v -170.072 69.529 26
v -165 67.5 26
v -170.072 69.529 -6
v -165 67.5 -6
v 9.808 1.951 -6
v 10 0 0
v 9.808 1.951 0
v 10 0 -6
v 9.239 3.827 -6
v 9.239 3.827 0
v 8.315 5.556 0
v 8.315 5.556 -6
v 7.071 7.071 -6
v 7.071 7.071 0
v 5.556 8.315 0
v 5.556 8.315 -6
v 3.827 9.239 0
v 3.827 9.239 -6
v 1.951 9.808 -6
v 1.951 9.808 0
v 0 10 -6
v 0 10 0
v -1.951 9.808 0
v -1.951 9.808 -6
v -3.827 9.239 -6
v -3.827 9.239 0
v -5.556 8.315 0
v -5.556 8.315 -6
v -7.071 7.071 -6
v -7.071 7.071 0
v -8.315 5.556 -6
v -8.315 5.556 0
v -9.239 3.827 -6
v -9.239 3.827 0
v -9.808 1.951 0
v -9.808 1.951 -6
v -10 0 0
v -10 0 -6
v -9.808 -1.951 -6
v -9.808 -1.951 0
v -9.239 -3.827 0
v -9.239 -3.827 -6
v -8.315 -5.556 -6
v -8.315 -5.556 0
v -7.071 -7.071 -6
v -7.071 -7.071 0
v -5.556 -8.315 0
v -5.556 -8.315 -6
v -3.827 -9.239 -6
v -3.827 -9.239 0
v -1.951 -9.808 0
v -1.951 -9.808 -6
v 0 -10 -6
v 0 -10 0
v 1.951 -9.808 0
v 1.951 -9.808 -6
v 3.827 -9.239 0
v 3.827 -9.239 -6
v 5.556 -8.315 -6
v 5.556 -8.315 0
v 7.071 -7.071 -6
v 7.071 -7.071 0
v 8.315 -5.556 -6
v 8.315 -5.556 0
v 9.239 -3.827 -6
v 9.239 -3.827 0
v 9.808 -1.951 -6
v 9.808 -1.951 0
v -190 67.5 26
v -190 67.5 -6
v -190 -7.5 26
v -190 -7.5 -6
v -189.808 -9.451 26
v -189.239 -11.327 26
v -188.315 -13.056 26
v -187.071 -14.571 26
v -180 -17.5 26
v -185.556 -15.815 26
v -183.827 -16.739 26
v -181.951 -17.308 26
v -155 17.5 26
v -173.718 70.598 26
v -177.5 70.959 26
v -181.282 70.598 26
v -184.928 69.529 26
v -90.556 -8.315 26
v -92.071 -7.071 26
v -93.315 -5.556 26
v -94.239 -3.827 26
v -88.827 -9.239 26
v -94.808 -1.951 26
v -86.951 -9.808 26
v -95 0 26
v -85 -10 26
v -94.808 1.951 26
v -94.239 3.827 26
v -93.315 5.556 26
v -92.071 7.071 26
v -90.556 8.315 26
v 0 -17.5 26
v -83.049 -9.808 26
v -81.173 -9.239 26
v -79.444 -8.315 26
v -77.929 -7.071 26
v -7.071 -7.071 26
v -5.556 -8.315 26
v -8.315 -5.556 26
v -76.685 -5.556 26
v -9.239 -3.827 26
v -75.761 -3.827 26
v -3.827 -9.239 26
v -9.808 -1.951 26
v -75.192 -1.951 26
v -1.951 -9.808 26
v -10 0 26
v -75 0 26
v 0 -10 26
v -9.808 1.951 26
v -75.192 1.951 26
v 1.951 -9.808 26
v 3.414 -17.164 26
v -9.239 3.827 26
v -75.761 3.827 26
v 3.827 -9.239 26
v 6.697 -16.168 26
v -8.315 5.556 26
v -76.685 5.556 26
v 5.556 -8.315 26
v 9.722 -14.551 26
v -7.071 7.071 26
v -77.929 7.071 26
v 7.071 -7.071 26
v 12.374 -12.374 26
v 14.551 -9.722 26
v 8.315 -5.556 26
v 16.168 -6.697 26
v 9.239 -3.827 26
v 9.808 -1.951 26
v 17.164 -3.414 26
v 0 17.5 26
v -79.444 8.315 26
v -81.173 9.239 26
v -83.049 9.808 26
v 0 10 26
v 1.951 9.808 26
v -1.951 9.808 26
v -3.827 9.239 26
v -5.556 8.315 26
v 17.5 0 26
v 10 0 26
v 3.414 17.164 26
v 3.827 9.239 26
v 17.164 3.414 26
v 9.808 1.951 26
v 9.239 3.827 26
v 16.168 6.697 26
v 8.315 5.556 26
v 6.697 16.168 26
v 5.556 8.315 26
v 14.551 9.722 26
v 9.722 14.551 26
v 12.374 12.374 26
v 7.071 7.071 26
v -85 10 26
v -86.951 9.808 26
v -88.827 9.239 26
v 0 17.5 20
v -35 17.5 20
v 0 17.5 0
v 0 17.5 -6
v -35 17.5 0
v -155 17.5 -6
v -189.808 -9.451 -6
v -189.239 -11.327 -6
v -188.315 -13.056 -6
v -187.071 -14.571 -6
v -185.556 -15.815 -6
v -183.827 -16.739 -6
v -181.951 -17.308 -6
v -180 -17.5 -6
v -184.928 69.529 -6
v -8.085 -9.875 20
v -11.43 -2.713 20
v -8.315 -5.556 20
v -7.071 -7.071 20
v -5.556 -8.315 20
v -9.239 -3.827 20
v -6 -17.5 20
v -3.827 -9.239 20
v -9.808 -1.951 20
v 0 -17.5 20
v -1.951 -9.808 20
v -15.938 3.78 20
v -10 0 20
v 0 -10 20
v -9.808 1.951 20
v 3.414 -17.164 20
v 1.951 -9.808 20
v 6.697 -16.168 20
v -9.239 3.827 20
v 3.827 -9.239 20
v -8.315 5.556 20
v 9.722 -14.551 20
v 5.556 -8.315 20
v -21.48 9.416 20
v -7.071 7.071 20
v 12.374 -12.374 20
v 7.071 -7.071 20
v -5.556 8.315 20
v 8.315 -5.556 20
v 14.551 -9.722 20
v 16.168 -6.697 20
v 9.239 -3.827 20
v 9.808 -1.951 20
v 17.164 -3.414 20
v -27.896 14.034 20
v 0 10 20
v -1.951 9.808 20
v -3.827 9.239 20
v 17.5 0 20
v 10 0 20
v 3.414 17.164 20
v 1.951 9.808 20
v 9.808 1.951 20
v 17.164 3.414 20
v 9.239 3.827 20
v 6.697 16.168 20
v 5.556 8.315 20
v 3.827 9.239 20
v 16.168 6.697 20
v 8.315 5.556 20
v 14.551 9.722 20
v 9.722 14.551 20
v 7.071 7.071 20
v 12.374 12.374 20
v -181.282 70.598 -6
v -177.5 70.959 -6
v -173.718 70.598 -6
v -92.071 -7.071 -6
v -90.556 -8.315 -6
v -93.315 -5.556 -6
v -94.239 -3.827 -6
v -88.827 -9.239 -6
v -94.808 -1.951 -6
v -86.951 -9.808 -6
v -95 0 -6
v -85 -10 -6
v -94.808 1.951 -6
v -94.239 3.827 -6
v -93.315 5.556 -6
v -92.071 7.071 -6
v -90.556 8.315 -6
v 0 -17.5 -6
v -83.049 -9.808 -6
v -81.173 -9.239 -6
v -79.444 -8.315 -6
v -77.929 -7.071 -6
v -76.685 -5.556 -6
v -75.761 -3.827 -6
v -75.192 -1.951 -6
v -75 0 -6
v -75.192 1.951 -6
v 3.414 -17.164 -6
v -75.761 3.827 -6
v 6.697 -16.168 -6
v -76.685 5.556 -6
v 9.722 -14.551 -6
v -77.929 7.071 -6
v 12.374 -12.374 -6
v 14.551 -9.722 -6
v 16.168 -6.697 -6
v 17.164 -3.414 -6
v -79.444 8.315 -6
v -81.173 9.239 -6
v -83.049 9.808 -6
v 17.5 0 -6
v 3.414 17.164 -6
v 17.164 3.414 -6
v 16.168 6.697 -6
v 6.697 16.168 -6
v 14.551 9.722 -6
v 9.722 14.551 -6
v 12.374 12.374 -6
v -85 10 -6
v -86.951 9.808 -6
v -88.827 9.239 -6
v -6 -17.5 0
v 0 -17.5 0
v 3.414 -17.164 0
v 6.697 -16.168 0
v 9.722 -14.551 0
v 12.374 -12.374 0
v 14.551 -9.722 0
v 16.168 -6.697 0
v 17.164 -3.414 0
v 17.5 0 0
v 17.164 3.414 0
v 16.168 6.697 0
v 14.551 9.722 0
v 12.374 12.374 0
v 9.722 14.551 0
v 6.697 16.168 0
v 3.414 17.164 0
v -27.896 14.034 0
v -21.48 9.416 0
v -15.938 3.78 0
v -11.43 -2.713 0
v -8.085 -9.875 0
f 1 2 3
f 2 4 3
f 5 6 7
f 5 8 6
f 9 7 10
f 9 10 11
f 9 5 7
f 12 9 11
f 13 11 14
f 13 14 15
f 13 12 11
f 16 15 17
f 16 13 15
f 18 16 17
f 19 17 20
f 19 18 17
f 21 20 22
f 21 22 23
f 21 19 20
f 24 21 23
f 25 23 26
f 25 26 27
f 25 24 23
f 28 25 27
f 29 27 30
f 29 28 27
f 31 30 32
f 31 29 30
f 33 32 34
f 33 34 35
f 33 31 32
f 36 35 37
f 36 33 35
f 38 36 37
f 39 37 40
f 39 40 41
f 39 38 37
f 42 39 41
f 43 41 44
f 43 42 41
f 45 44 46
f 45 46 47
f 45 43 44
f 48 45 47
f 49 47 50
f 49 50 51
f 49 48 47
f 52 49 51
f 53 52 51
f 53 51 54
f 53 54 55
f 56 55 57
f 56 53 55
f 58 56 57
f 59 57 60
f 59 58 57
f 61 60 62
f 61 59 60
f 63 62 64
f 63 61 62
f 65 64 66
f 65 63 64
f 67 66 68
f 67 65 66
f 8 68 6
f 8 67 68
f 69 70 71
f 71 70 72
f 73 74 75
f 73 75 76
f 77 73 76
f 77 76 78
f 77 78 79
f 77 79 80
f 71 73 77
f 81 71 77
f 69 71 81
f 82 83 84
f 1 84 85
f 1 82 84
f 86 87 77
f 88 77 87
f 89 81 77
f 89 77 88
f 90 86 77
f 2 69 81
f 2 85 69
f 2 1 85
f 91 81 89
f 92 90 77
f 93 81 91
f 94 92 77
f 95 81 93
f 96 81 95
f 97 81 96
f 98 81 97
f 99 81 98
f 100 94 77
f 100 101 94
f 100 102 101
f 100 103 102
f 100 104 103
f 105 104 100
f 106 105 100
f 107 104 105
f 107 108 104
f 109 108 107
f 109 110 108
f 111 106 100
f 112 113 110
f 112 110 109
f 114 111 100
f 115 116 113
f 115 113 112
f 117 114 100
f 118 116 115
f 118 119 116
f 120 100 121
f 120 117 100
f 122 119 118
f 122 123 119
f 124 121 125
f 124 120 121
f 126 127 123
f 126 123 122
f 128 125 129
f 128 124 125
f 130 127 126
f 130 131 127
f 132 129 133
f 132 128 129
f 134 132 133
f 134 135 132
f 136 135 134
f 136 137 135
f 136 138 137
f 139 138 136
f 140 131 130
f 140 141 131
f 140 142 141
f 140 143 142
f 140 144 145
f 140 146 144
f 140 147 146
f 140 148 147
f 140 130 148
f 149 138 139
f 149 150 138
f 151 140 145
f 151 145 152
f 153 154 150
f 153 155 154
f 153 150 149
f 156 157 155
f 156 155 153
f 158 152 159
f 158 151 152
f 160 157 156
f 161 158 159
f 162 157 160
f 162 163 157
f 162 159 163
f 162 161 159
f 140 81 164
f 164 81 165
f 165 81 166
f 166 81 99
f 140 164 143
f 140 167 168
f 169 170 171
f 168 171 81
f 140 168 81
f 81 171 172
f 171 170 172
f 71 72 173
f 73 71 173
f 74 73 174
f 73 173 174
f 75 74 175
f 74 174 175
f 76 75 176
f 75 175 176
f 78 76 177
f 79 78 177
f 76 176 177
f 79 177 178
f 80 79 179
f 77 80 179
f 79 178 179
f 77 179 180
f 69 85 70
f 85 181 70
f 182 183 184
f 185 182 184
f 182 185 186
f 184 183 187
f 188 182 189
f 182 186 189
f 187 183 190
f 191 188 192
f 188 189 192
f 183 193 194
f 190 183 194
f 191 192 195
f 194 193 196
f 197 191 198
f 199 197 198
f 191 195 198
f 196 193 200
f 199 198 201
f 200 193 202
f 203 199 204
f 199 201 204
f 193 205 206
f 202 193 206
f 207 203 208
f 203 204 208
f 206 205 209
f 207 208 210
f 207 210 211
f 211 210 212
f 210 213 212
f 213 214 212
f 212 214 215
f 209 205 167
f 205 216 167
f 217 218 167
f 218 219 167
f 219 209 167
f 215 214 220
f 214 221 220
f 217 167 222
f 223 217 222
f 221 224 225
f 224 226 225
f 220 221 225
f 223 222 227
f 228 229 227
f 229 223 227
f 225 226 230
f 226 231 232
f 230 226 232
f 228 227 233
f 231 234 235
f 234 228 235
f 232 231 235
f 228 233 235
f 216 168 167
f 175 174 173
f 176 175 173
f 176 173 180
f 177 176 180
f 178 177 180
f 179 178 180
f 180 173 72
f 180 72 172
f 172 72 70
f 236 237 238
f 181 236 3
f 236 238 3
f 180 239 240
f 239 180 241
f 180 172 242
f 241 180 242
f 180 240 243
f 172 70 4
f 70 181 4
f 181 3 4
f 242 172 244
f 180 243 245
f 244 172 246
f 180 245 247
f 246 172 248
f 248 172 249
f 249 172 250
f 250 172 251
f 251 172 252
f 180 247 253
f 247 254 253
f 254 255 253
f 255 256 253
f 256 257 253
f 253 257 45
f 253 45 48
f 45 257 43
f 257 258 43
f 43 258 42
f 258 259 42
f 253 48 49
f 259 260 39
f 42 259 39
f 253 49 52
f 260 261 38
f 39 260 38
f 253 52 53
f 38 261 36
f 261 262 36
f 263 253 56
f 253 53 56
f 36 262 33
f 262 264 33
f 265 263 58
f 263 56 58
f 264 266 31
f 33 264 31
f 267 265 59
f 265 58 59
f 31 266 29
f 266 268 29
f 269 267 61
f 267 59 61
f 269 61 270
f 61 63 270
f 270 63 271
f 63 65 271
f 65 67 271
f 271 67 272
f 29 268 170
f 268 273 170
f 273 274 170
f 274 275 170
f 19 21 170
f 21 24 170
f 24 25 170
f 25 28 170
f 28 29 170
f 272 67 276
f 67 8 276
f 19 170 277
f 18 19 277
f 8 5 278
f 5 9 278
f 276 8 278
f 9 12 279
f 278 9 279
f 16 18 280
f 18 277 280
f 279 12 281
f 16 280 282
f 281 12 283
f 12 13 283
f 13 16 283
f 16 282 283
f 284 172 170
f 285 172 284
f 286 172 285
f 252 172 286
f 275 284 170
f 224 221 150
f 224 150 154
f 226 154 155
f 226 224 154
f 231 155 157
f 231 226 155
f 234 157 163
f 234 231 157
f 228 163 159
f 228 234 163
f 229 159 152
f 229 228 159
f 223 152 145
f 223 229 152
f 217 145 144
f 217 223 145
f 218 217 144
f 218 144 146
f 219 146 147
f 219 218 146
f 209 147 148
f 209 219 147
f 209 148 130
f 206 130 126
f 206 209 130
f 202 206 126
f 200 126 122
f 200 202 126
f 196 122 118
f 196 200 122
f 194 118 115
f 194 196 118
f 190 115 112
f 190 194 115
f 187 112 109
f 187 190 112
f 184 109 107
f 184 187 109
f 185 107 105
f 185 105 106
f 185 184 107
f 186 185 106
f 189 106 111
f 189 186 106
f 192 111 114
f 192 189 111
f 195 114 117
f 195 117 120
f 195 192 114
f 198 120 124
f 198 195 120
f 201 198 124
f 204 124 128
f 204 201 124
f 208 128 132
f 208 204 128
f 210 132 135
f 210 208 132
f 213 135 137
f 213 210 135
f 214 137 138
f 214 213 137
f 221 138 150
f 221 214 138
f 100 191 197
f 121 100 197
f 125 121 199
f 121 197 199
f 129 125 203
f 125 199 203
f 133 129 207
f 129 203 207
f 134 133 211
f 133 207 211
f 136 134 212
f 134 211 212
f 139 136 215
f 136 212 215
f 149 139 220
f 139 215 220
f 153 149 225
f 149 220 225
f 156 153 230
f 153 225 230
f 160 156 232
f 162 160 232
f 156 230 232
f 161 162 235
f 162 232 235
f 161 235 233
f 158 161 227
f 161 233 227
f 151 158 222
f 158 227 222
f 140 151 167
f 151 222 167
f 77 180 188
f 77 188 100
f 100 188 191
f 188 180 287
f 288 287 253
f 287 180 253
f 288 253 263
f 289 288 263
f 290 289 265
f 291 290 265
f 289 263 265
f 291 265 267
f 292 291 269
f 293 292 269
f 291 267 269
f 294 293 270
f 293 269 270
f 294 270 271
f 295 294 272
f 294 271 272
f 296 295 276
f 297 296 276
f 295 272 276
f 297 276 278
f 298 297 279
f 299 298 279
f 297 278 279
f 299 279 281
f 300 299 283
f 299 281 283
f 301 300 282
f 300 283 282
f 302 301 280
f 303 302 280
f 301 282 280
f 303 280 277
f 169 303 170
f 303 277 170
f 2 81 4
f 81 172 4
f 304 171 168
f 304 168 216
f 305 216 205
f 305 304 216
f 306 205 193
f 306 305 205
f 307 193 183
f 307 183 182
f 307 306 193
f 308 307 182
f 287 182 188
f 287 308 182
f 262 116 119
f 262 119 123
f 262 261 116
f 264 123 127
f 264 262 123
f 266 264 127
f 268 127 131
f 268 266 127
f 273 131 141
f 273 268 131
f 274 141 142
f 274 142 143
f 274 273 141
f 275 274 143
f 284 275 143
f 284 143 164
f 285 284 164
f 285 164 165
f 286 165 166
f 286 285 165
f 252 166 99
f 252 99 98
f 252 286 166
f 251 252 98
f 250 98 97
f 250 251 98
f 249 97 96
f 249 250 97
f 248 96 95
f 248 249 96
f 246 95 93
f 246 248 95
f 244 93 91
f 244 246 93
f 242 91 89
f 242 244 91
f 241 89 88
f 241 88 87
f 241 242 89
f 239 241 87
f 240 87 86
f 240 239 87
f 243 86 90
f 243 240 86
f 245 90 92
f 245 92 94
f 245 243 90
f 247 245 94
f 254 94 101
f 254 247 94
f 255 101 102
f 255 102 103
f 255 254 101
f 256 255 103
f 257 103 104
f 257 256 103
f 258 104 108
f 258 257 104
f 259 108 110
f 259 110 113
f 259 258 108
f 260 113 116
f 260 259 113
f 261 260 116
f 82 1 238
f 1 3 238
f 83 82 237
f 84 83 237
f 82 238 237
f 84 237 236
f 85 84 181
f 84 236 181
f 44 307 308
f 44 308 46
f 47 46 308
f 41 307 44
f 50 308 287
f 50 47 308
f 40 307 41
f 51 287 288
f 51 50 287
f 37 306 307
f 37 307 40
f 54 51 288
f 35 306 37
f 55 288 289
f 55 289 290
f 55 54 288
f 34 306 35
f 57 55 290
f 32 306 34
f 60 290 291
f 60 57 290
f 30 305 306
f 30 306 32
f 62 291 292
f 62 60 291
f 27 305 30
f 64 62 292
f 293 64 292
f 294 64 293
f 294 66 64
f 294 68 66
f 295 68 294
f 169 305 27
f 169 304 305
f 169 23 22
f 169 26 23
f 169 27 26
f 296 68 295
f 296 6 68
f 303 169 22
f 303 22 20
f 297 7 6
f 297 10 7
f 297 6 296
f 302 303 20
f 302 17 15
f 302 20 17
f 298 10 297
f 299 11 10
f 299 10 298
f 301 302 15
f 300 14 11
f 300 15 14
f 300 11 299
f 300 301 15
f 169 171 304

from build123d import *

# Parameters (mm, degrees)
F0_R     = 10
F1_DEPTH = 6
F2_DEPTH = 26
F3_DEPTH = 20


with BuildPart() as f1:
    # F0 (on Top) → F1 (new body)
    with BuildSketch(Plane.XY):
        with BuildLine():
            Line((-6, -17.5), (0, -17.5))
            ThreePointArc((0, -17.5), (17.5, 0), (0, 17.5))
            Line((0, 17.5), (-35, 17.5))
            ThreePointArc((-35, 17.5), (-15.938437, 3.77958), (-6, -17.5))
        make_face()
        Circle(F0_R, mode=Mode.SUBTRACT)
        with BuildLine():
            Line((-180, -17.5), (-6, -17.5))
            ThreePointArc((-6, -17.5), (-15.938437, 3.77958), (-35, 17.5))
            Line((-35, 17.5), (-155, 17.5))
            Line((-155, 17.5), (-165, 67.5))
            Line((-165, 67.5), (-190, 67.5))
            Line((-190, 67.5), (-190, -7.5))
            ThreePointArc((-190, -7.5), (-187.071068, -14.571068), (-180, -17.5))
        make_face()
        with Locations((-85, 0)):
            Circle(F0_R, mode=Mode.SUBTRACT)
        with BuildLine():
            Line((-190, 67.5), (-165, 67.5))
            Line((-165, 67.5), (-170.072186, 69.528875))
            ThreePointArc((-170.072186, 69.528875), (-177.5, 70.959341), (-184.927814, 69.528875))
            Line((-184.927814, 69.528875), (-190, 67.5))
        make_face()
    extrude(amount=-F1_DEPTH)

    # F0 (on Top) → F2 (join)
    with BuildSketch(Plane.XY):
        with BuildLine():
            Line((-6, -17.5), (0, -17.5))
            ThreePointArc((0, -17.5), (17.5, 0), (0, 17.5))
            Line((0, 17.5), (-35, 17.5))
            ThreePointArc((-35, 17.5), (-15.938437, 3.77958), (-6, -17.5))
        make_face()
        Circle(F0_R, mode=Mode.SUBTRACT)
        with BuildLine():
            Line((-180, -17.5), (-6, -17.5))
            ThreePointArc((-6, -17.5), (-15.938437, 3.77958), (-35, 17.5))
            Line((-35, 17.5), (-155, 17.5))
            Line((-155, 17.5), (-165, 67.5))
            Line((-165, 67.5), (-190, 67.5))
            Line((-190, 67.5), (-190, -7.5))
            ThreePointArc((-190, -7.5), (-187.071068, -14.571068), (-180, -17.5))
        make_face()
        with Locations((-85, 0)):
            Circle(F0_R, mode=Mode.SUBTRACT)
        with BuildLine():
            Line((-190, 67.5), (-165, 67.5))
            Line((-165, 67.5), (-170.072186, 69.528875))
            ThreePointArc((-170.072186, 69.528875), (-177.5, 70.959341), (-184.927814, 69.528875))
            Line((-184.927814, 69.528875), (-190, 67.5))
        make_face()
    extrude(amount=F2_DEPTH)

    # F0 (on Top) → F3 (cut)
    with BuildSketch(Plane.XY):
        with BuildLine():
            Line((-6, -17.5), (0, -17.5))
            ThreePointArc((0, -17.5), (17.5, 0), (0, 17.5))
            Line((0, 17.5), (-35, 17.5))
            ThreePointArc((-35, 17.5), (-15.938437, 3.77958), (-6, -17.5))
        make_face()
        Circle(F0_R, mode=Mode.SUBTRACT)
    extrude(amount=F3_DEPTH, mode=Mode.SUBTRACT)


solid = f1.part
